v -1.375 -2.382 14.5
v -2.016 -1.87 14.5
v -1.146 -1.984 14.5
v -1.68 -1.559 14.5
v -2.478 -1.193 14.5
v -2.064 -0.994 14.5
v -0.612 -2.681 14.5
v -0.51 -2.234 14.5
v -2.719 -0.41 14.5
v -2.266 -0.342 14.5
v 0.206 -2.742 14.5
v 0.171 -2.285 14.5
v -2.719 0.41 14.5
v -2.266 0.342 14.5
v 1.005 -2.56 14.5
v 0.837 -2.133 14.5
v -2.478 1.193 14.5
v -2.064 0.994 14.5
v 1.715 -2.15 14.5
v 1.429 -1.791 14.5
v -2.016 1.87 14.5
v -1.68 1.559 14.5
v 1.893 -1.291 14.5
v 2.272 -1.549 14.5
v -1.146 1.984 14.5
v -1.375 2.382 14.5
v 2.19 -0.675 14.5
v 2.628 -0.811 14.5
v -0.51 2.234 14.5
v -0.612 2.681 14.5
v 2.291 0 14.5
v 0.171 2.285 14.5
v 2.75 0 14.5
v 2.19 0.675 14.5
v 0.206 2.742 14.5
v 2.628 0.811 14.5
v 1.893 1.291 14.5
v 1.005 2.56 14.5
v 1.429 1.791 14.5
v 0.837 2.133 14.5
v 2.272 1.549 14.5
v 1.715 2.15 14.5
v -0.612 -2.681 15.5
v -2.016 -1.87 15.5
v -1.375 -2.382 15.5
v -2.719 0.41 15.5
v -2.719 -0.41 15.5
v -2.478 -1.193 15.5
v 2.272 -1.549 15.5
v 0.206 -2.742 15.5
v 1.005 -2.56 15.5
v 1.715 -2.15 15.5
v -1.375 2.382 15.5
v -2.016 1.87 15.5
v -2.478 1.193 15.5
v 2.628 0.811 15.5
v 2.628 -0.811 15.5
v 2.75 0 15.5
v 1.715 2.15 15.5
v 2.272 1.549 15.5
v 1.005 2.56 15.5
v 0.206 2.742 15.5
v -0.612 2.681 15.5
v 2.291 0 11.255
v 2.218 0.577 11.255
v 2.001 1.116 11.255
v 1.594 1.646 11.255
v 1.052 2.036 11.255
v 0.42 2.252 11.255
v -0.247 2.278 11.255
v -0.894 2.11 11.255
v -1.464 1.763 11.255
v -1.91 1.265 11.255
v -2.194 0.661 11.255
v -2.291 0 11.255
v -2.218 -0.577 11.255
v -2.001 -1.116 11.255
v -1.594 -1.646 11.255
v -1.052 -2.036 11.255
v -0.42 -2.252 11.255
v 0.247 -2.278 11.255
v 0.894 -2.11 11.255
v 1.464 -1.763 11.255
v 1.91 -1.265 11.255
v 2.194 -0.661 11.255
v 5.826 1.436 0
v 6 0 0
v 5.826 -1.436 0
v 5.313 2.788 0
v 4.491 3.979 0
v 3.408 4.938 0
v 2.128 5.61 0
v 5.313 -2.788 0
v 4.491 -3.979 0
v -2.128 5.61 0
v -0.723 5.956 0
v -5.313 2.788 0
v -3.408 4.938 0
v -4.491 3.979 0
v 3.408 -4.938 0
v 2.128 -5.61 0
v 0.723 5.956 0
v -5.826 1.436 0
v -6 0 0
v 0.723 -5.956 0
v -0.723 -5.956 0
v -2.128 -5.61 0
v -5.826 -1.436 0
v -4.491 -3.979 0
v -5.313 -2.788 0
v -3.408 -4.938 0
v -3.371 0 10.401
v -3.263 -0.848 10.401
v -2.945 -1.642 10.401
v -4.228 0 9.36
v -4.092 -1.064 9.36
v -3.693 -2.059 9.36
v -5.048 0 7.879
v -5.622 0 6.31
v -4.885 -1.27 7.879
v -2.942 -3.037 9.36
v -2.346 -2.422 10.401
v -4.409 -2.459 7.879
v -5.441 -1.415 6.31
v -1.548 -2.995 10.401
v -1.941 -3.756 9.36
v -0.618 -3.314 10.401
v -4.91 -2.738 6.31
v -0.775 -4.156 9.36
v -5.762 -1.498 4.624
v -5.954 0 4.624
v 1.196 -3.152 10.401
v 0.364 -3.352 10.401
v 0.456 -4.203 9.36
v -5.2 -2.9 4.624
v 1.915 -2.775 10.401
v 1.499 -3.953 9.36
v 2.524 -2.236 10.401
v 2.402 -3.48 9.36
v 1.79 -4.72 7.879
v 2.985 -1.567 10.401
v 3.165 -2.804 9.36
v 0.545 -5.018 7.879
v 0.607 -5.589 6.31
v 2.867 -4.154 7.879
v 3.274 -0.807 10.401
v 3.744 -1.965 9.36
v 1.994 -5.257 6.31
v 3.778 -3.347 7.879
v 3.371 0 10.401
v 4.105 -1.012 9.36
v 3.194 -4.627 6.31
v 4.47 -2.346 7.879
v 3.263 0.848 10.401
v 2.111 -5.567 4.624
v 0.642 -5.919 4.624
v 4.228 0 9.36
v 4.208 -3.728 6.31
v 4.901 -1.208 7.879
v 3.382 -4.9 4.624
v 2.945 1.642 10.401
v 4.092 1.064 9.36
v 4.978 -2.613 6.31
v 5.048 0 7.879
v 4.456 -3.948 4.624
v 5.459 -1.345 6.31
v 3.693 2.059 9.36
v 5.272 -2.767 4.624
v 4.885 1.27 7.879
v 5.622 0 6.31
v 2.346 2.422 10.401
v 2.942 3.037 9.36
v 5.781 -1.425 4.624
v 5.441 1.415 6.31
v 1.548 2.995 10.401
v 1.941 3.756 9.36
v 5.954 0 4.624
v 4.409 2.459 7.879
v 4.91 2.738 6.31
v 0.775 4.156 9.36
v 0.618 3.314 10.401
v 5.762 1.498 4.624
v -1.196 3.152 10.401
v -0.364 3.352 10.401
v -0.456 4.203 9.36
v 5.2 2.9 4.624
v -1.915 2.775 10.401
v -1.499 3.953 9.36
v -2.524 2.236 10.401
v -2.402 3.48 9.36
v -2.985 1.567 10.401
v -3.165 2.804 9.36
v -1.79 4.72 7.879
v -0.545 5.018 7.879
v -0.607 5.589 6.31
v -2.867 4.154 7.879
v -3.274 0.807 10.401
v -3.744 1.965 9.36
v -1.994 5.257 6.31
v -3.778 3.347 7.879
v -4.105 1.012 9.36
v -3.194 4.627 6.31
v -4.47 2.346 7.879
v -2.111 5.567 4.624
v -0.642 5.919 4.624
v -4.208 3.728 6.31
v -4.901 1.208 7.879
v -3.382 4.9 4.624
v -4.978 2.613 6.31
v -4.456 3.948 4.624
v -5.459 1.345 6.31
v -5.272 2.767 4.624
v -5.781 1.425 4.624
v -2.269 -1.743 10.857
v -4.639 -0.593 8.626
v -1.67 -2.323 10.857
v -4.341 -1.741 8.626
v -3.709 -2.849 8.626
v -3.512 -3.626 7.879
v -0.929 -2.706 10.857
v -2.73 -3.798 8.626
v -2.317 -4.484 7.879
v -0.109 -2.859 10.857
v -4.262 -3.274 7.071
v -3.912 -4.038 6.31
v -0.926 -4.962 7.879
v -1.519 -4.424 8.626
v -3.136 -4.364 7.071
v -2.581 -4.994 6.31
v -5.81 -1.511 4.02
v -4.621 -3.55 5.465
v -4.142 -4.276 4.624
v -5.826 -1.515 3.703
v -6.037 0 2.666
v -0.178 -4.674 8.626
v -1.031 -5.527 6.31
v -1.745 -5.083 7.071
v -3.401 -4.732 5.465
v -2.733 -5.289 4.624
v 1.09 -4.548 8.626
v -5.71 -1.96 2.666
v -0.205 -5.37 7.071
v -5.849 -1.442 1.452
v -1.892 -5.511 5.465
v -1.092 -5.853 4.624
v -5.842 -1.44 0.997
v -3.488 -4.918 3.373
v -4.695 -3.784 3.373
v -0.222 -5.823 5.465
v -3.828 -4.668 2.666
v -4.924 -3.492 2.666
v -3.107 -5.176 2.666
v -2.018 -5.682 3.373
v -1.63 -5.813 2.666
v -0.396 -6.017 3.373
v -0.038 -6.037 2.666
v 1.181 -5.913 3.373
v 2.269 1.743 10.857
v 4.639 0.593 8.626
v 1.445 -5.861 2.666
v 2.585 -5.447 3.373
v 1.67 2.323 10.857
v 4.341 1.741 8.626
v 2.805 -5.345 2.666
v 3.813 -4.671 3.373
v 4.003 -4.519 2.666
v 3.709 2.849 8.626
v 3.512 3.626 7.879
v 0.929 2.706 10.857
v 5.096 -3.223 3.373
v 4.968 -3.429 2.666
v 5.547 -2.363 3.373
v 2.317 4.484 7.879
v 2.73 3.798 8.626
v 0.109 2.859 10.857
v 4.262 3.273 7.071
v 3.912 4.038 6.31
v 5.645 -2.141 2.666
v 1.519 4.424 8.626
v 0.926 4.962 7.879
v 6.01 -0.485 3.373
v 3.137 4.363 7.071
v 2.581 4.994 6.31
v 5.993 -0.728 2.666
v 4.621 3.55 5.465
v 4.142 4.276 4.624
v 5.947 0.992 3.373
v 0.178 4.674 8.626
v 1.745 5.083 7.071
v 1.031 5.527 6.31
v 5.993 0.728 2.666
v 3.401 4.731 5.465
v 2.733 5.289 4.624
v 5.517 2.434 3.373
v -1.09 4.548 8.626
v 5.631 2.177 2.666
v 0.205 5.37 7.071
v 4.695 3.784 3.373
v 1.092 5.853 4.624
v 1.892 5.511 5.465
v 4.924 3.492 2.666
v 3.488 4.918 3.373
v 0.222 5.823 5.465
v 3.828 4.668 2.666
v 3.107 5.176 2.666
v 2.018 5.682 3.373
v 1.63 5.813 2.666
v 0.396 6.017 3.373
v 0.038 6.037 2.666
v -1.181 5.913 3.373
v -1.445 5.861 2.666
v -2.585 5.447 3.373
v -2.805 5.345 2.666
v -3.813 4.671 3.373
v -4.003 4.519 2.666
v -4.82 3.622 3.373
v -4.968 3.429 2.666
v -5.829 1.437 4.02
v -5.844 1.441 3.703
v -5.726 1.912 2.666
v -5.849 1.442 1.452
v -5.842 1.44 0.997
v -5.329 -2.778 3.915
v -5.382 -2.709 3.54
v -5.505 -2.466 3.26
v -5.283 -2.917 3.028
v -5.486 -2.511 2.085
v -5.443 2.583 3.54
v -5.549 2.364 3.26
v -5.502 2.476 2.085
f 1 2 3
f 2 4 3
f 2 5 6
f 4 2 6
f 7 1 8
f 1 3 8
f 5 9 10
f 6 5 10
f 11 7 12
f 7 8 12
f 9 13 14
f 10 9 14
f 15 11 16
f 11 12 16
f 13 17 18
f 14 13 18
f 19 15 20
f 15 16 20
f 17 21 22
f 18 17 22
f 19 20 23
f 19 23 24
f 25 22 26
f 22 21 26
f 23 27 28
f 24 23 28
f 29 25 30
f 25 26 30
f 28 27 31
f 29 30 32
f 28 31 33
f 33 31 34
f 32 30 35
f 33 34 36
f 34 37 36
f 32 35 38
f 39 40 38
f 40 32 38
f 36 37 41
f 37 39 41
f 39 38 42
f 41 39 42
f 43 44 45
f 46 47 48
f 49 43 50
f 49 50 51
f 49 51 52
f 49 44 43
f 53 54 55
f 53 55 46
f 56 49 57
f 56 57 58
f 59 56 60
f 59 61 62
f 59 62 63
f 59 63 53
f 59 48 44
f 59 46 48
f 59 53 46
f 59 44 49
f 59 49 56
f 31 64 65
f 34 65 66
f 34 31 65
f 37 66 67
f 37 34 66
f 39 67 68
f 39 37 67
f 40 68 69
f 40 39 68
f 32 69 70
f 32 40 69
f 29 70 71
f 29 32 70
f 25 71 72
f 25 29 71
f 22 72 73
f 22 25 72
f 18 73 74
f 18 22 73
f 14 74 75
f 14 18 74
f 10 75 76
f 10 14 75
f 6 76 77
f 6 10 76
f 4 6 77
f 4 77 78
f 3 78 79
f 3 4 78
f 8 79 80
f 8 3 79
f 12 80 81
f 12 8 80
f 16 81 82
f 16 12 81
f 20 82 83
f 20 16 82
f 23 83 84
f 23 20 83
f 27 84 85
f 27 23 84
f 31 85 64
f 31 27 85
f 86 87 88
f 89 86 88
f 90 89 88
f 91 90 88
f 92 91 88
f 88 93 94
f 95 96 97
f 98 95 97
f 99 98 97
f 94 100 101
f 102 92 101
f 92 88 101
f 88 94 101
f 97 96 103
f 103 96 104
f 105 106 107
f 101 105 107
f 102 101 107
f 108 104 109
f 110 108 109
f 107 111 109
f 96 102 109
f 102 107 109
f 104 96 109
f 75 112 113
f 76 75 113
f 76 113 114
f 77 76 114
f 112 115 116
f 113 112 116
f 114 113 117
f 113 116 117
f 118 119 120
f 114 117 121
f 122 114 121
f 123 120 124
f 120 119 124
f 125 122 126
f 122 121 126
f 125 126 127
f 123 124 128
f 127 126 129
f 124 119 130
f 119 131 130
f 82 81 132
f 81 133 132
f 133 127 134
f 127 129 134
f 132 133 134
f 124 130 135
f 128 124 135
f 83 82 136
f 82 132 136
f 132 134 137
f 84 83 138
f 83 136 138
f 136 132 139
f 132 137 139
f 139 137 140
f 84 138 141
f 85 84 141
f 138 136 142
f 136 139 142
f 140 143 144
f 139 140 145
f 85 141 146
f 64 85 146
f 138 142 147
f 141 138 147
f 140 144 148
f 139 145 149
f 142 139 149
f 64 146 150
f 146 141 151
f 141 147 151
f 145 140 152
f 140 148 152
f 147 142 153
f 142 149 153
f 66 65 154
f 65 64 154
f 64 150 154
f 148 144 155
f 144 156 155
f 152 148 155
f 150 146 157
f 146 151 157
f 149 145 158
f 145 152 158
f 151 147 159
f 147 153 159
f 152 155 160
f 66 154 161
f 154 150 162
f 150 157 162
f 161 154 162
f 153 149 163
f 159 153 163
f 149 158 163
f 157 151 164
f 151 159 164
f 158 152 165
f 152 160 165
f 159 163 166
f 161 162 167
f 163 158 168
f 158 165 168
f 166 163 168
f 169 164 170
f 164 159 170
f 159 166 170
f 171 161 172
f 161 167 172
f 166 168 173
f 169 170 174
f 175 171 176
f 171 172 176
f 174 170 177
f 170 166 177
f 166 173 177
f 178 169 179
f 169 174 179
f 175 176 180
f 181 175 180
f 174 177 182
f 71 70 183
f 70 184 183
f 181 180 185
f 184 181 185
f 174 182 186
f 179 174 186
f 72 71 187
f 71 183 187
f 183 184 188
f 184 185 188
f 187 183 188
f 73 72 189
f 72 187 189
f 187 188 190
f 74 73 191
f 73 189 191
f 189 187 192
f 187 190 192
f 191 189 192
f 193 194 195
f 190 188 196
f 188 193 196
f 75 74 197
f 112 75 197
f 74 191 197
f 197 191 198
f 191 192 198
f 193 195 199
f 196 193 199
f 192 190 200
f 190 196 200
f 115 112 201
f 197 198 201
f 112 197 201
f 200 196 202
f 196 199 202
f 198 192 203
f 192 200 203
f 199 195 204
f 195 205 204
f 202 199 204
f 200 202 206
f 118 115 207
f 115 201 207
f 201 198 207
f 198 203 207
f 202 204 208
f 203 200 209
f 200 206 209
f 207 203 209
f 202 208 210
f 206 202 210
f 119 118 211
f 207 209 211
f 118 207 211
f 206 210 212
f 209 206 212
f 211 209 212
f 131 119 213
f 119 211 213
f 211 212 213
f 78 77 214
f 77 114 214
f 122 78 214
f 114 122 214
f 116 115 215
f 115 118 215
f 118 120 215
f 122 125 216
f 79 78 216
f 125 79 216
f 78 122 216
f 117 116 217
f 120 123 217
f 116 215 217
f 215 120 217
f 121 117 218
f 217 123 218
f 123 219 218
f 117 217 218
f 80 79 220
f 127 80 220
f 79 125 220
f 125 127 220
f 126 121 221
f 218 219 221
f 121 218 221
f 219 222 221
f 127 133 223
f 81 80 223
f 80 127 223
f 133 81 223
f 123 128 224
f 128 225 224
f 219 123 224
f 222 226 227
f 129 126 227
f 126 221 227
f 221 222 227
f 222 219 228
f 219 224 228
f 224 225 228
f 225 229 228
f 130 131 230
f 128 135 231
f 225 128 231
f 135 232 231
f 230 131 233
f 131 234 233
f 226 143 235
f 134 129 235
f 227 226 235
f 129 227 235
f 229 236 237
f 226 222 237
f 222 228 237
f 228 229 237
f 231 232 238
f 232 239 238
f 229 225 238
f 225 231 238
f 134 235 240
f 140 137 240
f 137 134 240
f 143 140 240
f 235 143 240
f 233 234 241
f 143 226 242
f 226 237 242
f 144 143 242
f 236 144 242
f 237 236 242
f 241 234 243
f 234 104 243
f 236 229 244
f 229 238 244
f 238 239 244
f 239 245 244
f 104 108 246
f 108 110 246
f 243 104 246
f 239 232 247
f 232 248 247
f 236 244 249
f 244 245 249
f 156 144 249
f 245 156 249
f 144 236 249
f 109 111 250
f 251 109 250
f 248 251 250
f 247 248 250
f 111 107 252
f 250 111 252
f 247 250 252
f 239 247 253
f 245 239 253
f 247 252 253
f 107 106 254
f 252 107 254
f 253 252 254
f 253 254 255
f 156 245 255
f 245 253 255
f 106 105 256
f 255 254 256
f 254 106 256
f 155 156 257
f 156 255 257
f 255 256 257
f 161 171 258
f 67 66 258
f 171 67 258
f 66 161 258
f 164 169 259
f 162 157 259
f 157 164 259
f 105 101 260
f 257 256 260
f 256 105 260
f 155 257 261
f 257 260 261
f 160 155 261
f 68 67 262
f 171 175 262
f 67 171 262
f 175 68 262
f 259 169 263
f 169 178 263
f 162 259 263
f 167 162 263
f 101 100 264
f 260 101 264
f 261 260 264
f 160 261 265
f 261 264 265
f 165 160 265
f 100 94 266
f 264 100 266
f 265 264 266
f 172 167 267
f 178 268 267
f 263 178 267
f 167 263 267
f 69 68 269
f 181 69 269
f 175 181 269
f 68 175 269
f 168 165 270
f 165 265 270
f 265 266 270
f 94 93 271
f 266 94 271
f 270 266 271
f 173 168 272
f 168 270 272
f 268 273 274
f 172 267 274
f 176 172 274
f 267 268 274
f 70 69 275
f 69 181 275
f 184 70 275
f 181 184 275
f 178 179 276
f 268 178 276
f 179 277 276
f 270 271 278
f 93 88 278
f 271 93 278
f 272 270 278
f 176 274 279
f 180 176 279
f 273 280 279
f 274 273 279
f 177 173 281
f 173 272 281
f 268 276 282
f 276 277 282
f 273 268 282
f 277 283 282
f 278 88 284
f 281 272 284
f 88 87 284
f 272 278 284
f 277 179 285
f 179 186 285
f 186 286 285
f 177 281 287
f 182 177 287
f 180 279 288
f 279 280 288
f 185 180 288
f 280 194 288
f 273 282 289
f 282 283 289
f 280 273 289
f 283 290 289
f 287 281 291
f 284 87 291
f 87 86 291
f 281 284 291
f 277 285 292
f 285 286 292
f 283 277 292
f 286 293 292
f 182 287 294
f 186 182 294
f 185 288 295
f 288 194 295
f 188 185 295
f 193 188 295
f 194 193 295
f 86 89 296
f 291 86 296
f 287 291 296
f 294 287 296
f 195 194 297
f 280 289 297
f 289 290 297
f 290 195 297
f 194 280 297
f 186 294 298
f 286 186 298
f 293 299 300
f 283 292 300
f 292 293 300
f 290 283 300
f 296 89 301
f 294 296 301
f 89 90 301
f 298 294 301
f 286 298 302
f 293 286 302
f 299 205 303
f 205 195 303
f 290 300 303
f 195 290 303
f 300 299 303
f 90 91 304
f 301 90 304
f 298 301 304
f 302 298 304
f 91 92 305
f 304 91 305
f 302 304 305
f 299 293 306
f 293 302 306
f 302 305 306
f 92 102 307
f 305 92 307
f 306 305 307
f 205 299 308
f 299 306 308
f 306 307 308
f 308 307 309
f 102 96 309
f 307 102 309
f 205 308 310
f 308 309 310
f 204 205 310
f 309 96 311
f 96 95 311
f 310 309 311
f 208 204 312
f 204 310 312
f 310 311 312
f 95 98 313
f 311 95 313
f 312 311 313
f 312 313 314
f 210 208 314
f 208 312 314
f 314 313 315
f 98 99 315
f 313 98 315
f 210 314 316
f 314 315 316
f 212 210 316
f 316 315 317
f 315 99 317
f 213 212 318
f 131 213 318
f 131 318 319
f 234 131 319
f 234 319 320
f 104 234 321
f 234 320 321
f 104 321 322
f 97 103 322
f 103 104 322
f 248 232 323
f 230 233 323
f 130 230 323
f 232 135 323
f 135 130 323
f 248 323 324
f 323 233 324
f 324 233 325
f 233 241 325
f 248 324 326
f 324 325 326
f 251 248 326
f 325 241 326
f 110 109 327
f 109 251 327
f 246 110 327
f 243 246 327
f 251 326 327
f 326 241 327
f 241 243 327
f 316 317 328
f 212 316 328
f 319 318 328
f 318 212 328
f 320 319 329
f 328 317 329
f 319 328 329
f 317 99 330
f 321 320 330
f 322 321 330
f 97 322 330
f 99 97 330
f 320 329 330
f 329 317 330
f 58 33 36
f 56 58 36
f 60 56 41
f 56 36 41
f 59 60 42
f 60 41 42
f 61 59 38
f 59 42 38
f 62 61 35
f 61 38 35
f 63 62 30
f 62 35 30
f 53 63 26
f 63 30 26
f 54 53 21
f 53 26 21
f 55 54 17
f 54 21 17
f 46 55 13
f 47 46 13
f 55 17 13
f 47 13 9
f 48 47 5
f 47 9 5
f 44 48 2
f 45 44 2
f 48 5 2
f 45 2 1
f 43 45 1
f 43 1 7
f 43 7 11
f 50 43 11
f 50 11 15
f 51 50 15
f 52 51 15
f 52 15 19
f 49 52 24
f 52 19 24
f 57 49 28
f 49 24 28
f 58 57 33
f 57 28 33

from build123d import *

# Parameters (mm, degrees)
F3_R     = 2.291344539
F4_DEPTH = 2.5
F5_R     = 2.75
F6_DEPTH = 1


with BuildPart() as f1:
    # F0 (on Front) → F1 (revolve)
    with BuildSketch(Plane.XZ):
        with BuildLine():
            Line((-6, 0), (0, 0))
            Line((0, 0), (0, 12))
            add(Edge.make_bspline(
                [(0, 12), (-3.2266811418, 11.7082983458), (-6.2449243477, 6.1923159091), (-6.0526283931, 3.414490179), (-6, 0)],
                knots=[0, 0, 0, 0, 0.5139326164, 1, 1, 1, 1], degree=3))
        make_face()
    revolve(axis=Axis((0, 0, 6), (0, 0, 1)))

    # F3 (on offset) → F4 (join, symmetric)
    with BuildSketch(Plane.XY.offset(12)):
        Circle(F3_R)
    extrude(amount=F4_DEPTH, both=True)

    # F5 (on face) → F6 (join)
    with BuildSketch(Plane.XY.offset(14.5)):
        Circle(F5_R)
    extrude(amount=F6_DEPTH)


solid = f1.part
